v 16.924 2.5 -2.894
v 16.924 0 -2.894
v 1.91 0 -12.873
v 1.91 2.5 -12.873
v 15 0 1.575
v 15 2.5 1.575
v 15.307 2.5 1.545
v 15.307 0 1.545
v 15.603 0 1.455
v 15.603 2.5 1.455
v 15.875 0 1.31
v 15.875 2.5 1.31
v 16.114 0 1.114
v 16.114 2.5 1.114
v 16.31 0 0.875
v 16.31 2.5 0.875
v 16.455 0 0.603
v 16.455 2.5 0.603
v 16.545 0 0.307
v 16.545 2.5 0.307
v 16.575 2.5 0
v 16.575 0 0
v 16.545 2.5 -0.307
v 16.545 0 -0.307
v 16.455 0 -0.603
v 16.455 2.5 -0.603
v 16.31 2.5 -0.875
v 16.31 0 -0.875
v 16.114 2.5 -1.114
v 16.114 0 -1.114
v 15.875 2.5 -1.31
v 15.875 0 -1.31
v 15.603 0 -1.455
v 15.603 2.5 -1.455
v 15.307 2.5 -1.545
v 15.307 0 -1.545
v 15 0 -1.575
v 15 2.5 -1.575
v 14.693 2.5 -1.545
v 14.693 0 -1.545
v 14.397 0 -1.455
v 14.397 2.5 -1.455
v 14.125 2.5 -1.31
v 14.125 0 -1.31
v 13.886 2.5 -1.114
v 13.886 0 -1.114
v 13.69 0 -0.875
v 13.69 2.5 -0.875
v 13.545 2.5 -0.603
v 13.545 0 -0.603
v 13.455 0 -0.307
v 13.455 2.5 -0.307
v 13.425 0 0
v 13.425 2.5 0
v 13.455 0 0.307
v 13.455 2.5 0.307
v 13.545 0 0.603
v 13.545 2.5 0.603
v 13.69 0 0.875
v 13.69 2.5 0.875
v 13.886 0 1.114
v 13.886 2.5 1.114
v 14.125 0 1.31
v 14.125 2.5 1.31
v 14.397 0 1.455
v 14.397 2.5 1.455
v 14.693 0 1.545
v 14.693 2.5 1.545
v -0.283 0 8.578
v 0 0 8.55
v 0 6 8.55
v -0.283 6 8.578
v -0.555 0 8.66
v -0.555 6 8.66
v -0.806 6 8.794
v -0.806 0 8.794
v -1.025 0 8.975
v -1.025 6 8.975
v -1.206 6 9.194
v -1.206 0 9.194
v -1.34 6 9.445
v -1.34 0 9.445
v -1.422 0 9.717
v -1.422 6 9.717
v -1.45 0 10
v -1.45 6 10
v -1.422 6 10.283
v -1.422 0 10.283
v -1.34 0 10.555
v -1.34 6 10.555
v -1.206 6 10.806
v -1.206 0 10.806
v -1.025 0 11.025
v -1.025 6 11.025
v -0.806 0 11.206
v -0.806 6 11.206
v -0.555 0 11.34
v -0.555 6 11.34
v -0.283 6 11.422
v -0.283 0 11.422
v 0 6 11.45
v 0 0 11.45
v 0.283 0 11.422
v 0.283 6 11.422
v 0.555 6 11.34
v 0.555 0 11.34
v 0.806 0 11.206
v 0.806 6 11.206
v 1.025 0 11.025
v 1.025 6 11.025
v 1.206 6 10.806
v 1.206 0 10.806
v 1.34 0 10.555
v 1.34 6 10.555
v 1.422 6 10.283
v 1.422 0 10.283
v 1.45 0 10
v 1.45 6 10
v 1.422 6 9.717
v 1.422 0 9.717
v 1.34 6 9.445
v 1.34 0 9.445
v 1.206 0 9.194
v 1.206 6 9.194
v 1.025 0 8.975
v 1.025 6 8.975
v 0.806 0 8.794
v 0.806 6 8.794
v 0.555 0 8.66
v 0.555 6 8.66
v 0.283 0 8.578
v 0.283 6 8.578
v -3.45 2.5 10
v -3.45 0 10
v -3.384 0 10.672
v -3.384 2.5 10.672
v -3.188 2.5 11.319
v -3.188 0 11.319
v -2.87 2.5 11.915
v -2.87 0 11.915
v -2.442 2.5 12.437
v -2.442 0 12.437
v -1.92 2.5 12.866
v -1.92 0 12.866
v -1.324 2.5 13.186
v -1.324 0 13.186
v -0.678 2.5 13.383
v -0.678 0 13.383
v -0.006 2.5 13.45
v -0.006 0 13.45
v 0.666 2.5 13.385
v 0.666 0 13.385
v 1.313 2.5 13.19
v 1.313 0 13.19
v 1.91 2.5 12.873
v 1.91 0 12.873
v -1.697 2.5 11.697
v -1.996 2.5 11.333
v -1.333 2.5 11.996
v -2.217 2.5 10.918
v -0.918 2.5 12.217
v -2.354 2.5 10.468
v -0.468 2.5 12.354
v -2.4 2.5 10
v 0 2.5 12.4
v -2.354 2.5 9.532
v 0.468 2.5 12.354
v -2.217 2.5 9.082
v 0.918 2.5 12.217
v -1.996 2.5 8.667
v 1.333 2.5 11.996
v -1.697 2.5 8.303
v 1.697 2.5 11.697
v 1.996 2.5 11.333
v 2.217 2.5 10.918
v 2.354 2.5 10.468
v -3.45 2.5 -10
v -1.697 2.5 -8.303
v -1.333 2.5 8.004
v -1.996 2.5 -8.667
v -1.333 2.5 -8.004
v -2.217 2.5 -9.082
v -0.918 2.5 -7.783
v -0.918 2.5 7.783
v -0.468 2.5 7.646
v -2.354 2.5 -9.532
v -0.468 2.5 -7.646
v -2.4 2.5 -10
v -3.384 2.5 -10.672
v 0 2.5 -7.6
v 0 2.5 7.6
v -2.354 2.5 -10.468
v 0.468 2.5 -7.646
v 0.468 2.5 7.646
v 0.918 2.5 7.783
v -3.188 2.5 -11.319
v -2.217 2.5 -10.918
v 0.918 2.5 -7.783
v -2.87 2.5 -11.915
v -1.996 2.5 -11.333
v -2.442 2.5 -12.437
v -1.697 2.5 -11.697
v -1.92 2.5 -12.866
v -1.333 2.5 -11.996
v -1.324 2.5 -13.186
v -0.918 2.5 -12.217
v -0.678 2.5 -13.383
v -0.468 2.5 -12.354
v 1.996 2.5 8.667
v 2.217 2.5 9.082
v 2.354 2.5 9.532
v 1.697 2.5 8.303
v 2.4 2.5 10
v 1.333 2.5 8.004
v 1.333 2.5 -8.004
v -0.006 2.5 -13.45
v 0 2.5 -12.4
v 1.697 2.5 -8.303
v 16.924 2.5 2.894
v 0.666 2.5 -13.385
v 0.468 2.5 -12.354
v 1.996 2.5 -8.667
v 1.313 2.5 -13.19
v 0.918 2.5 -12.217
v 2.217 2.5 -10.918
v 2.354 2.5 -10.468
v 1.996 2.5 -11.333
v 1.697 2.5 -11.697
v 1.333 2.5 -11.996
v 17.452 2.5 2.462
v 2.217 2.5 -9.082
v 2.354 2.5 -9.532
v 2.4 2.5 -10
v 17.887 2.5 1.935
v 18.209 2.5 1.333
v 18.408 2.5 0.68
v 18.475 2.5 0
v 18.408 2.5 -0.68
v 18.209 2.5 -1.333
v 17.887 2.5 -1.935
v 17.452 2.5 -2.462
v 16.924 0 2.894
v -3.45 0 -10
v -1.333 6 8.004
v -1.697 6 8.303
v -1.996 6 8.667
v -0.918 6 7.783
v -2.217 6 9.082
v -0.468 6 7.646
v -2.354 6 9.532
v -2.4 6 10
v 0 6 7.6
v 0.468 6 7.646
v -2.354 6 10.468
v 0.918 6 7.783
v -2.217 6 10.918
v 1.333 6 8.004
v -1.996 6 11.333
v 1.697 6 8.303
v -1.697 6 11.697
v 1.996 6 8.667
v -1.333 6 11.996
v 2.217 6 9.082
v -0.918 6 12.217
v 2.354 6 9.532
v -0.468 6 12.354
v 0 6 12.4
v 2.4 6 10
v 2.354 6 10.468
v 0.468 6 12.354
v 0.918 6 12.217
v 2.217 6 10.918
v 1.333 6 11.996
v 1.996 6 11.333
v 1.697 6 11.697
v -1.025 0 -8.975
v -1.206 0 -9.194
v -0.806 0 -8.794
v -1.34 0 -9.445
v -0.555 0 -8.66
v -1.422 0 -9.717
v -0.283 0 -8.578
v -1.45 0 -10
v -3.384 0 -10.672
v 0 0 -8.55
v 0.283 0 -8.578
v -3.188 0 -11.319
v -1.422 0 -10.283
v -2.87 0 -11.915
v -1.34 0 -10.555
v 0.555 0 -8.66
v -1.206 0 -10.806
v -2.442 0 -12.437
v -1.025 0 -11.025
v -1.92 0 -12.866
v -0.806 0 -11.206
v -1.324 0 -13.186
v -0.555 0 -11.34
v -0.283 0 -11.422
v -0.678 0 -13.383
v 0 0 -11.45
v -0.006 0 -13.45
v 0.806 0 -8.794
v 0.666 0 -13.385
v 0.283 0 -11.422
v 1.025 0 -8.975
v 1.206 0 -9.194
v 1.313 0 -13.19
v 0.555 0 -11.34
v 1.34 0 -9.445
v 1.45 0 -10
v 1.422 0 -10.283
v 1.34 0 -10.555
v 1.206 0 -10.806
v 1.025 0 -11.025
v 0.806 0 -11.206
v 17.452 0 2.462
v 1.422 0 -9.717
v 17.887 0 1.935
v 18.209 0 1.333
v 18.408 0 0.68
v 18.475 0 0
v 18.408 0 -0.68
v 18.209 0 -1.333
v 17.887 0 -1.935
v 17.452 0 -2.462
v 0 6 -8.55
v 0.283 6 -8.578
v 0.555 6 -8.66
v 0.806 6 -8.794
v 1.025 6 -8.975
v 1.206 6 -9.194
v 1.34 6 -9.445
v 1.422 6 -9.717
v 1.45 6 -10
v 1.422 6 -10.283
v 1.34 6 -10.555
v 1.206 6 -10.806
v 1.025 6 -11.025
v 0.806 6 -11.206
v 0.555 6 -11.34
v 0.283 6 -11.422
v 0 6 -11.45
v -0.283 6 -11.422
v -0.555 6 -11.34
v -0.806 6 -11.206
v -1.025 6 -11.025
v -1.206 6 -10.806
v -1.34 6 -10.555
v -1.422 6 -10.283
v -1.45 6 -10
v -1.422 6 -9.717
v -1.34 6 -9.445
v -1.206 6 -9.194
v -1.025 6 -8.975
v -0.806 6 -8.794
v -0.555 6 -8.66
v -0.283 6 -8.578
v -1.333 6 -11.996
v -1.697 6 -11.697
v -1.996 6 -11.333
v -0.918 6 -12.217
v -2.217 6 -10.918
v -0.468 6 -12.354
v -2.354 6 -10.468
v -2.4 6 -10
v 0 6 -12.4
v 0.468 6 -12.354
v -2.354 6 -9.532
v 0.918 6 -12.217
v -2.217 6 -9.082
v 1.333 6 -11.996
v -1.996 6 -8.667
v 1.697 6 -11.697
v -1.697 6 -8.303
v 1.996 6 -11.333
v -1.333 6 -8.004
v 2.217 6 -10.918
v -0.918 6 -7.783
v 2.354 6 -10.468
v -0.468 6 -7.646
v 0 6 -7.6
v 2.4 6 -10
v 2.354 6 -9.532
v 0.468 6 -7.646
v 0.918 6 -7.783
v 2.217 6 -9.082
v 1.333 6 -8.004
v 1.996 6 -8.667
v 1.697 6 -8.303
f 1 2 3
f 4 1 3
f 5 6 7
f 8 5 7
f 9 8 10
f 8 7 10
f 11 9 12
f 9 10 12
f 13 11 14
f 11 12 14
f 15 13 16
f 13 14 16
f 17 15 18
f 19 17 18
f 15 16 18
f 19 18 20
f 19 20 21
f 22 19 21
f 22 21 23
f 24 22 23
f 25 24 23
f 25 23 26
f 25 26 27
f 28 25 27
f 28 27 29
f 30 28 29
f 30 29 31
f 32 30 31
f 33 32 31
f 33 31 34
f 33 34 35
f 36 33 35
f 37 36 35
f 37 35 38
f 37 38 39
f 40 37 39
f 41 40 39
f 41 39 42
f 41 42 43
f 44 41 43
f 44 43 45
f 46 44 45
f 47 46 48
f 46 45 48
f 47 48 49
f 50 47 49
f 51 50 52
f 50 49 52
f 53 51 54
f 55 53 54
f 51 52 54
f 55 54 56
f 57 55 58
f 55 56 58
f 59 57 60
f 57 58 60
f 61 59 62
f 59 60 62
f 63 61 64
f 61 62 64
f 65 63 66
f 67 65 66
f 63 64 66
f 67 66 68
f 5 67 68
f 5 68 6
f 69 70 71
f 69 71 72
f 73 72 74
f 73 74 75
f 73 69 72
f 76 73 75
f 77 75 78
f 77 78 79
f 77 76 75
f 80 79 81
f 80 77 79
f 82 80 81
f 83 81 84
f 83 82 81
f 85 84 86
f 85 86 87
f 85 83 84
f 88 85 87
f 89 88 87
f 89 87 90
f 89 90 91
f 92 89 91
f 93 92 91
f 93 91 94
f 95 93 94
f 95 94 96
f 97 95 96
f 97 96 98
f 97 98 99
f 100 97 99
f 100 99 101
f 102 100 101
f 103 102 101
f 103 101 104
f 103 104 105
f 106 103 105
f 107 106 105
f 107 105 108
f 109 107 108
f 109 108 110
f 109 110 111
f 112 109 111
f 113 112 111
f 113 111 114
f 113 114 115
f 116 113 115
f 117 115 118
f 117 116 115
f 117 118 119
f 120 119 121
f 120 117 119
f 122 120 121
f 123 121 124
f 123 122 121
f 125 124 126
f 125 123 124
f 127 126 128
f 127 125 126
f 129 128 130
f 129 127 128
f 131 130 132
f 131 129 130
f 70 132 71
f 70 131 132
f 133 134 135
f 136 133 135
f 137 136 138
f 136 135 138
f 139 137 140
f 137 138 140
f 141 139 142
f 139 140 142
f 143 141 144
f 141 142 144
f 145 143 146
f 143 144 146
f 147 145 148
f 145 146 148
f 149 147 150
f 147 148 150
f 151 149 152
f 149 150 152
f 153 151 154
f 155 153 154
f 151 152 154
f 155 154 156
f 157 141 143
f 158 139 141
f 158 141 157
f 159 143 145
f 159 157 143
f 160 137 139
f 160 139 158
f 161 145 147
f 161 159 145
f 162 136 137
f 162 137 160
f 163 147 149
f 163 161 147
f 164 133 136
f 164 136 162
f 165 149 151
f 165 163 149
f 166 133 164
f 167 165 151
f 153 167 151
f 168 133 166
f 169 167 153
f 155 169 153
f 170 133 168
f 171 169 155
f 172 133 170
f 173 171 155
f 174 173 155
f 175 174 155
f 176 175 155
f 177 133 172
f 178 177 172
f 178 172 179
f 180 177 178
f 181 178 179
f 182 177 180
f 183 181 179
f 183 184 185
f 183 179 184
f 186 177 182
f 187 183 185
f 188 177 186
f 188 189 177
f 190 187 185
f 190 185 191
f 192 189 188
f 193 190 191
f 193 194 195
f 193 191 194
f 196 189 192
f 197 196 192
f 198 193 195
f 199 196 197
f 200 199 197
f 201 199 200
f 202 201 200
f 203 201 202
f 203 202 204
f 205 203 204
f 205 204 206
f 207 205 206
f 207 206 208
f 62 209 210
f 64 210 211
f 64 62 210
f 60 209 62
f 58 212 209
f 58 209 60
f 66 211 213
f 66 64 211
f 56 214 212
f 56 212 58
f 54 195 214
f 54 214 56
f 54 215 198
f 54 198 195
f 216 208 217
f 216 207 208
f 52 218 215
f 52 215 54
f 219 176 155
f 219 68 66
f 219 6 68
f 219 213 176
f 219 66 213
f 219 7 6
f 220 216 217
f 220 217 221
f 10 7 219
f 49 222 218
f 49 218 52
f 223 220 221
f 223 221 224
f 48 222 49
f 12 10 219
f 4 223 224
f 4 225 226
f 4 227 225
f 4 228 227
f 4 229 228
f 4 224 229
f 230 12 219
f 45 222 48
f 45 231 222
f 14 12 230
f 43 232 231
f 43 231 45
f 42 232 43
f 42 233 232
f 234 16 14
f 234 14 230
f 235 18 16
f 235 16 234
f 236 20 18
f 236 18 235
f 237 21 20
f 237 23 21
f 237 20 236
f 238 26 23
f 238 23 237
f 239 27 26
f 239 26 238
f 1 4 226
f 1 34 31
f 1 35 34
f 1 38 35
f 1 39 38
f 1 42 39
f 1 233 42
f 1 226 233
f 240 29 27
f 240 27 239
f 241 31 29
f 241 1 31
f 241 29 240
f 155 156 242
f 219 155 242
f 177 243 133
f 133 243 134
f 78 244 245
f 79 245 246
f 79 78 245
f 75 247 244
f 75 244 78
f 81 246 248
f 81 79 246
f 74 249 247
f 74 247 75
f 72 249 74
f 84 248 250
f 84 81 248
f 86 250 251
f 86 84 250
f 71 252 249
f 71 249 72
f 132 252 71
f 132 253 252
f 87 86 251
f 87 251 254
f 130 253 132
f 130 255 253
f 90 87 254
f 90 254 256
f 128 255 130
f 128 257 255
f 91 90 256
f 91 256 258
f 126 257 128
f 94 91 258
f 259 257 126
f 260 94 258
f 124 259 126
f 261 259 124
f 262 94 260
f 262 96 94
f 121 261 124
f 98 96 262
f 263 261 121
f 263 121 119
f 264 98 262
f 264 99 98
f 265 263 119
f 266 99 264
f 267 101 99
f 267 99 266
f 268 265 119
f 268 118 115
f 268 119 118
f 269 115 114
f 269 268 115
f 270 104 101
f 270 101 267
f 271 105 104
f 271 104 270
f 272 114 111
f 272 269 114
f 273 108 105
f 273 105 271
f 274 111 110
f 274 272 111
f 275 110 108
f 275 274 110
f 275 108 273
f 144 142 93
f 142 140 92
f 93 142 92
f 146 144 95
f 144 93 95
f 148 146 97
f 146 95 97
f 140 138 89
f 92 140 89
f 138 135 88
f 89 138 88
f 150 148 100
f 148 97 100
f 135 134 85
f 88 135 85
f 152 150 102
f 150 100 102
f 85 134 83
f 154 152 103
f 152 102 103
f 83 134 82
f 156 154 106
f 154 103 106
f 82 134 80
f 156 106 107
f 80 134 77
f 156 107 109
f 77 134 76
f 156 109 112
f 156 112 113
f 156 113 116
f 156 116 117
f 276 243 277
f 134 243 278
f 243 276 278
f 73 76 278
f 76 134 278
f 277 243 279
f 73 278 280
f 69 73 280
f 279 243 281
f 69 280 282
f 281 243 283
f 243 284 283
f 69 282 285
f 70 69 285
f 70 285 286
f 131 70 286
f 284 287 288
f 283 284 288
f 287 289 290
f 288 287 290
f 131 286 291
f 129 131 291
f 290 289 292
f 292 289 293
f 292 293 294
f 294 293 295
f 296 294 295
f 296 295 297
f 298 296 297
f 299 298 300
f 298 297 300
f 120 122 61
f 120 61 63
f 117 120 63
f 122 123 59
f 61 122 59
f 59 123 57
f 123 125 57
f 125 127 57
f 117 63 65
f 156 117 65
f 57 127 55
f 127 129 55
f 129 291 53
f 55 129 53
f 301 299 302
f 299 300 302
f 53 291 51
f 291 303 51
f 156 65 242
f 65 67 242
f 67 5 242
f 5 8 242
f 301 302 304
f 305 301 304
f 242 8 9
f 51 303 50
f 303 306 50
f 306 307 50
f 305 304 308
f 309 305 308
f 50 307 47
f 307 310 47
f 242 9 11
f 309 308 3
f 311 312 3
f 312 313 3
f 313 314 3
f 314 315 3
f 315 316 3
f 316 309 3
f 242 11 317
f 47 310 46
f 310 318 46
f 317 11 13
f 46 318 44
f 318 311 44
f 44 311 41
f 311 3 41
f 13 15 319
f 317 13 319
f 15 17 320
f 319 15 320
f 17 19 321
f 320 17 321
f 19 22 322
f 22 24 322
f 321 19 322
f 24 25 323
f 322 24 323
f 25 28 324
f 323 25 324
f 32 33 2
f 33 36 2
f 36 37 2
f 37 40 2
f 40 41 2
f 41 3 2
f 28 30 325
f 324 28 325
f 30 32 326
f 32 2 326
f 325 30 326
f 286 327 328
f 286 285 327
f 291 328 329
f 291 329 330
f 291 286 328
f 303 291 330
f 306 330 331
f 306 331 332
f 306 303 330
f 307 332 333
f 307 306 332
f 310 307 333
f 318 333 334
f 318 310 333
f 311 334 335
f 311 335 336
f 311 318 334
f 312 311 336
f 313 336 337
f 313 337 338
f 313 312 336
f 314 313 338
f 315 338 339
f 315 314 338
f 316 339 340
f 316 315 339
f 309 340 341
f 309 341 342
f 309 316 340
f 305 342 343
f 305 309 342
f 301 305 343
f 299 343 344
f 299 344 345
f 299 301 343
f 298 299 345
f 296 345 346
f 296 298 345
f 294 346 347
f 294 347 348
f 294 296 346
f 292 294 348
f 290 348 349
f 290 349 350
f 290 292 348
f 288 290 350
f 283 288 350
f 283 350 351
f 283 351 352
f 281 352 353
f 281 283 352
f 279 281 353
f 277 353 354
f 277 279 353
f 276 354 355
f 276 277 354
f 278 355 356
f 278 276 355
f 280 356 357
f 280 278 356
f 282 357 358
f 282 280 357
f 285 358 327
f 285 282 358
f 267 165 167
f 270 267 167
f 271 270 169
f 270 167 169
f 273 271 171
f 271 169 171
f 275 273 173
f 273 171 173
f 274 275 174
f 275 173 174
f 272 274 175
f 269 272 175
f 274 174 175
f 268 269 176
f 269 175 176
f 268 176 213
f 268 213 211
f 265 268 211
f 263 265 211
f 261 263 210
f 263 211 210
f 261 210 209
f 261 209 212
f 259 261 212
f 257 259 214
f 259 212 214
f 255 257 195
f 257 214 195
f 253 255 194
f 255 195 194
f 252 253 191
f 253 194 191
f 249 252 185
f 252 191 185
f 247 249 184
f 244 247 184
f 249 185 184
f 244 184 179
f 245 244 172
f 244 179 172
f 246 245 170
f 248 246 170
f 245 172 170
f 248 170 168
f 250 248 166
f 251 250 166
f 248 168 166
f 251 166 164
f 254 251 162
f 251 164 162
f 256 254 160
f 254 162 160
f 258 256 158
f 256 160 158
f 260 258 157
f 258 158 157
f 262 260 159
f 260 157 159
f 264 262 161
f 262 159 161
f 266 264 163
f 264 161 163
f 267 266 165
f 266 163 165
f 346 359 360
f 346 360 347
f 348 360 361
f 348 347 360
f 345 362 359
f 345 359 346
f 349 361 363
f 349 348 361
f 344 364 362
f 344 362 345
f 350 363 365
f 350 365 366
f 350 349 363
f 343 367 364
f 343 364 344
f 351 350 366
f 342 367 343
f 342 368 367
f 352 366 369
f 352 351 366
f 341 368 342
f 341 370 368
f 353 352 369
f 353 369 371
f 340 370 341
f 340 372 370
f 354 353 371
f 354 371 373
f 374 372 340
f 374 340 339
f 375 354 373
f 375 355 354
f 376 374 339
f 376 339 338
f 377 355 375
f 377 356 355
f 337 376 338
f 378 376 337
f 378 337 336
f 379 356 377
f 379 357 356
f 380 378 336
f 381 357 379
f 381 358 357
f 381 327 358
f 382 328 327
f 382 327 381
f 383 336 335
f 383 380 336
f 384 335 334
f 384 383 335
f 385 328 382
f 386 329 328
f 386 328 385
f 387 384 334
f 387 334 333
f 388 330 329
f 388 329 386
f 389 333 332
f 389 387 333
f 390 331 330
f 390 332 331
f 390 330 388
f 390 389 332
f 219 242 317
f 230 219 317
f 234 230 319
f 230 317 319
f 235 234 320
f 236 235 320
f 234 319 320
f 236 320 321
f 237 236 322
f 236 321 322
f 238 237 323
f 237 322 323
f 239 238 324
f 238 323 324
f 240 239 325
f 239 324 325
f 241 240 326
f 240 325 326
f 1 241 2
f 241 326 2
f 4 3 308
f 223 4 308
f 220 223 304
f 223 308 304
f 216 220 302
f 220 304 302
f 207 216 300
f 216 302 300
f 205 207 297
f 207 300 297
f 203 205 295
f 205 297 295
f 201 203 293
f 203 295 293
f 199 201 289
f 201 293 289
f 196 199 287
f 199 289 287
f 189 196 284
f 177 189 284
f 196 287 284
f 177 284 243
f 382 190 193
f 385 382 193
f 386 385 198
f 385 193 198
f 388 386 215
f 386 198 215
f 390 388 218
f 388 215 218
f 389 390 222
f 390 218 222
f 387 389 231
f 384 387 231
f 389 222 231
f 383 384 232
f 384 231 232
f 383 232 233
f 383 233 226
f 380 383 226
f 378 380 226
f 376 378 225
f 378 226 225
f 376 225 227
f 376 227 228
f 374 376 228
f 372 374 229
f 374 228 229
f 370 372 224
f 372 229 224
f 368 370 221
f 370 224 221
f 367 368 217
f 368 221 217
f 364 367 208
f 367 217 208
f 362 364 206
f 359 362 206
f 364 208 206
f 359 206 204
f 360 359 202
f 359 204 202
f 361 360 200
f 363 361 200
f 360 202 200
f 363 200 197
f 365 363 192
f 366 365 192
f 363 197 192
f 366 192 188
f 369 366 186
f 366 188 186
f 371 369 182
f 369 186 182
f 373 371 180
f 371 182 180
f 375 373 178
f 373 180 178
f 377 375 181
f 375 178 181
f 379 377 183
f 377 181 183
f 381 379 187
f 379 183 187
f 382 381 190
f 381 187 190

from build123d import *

# Parameters (mm, degrees)
CROQUIS2_R              = 1.45
SALIENTE_EXTRUIR1_DEPTH = 2.5
CROQUIS3_R              = 2.4
CROQUIS3_R_2            = 1.45
SALIENTE_EXTRUIR2_DEPTH = 3.5
CROQUIS4_R              = 1.575
CORTAR_EXTRUIR1_DEPTH   = 24.118782948


with BuildPart() as part:
    # Croquis2 → Saliente-Extruir1 (new body)
    with BuildSketch(Plane(origin=(0, 0, 0), x_dir=(1, 0, 0), z_dir=(0, 1, 0))):
        with BuildLine():
            Line((-3.45, 10), (-3.45, -10))
            ThreePointArc((-3.45, -10), (-1.630018545, -13.040647882), (1.909733068, -12.873224601))
            Line((1.909733068, -12.873224601), (16.923571713, -2.89404507))
            ThreePointArc((16.923571713, -2.89404507), (18.475, 0), (16.923571713, 2.89404507))
            Line((16.923571713, 2.89404507), (1.909733068, 12.873224601))
            ThreePointArc((1.909733068, 12.873224601), (-1.630018545, 13.040647882), (-3.45, 10))
        make_face()
        with Locations(Location((0, 10, 0), (0, 0, 270))):
            Circle(CROQUIS2_R, mode=Mode.SUBTRACT)
        with Locations(Location((0, -10, 0), (0, 0, 90))):
            Circle(CROQUIS2_R, mode=Mode.SUBTRACT)
    extrude(amount=SALIENTE_EXTRUIR1_DEPTH)

    # Croquis3 → Saliente-Extruir2 (add)
    # profile 1 of 2: a face of its own
    with BuildSketch(Plane(origin=(0, 2.5, 0), x_dir=(1, 0, 0), z_dir=(0, 1, 0))):
        with Locations(Location((0, 10, 0), (0, 0, 270))):
            Circle(CROQUIS3_R)
        with Locations(Location((0, 10, 0), (0, 0, 270))):
            Circle(CROQUIS3_R_2, mode=Mode.SUBTRACT)
    # profile 2 of 2: a face of its own
    with BuildSketch(Plane(origin=(0, 2.5, 0), x_dir=(1, 0, 0), z_dir=(0, 1, 0))):
        with Locations(Location((0, -10, 0), (0, 0, 270))):
            Circle(CROQUIS3_R)
        with Locations(Location((0, -10, 0), (0, 0, 90))):
            Circle(CROQUIS3_R_2, mode=Mode.SUBTRACT)
    extrude(amount=SALIENTE_EXTRUIR2_DEPTH)

    # Croquis4 → Cortar-Extruir1 (cut, through all)
    with BuildSketch(Plane(origin=(0, 2.5, 0), x_dir=(1, 0, 0), z_dir=(0, 1, 0))):
        with Locations(Location((15, 0, 0), (0, 0, 270))):
            Circle(CROQUIS4_R)
    extrude(amount=-CORTAR_EXTRUIR1_DEPTH, mode=Mode.SUBTRACT)


solid = part.part
